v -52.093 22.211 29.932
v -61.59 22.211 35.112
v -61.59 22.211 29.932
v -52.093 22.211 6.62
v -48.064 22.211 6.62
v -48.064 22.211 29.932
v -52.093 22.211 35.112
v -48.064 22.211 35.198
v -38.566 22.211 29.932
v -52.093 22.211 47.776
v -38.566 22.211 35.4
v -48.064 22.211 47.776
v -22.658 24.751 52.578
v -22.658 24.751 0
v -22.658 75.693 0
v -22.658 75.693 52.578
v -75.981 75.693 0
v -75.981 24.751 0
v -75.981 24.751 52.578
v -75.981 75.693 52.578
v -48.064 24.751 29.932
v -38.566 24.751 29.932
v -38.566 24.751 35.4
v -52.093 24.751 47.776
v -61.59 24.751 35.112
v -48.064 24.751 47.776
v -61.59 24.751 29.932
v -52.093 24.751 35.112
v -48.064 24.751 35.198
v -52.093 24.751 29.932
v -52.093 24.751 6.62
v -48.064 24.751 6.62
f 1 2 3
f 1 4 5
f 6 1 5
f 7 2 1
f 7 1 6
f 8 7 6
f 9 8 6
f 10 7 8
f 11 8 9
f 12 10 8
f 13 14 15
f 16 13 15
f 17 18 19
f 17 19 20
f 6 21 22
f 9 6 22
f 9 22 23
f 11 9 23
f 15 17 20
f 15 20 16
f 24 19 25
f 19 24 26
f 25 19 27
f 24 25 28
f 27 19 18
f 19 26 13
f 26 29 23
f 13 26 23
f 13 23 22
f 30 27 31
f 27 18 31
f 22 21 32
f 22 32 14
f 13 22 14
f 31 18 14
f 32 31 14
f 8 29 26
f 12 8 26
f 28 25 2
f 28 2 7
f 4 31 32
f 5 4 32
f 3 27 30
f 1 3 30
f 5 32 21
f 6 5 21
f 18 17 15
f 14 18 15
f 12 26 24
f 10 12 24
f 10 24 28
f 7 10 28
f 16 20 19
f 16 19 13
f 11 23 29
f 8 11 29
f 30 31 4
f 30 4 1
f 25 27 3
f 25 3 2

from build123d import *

# Parameters (mm, degrees)
F0_W     = 53.322375752
F0_H     = 50.9416181594
F1_DEPTH = 52.578
F2_W     = 9.497590363
F2_H     = 5.180504173
F2_W_2   = 4.0292814374
F2_H_2   = 23.3122664504
F3_DEPTH = 2.54


with BuildPart() as f1:
    # F0 (on Top) → F1 (new body)
    with BuildSketch(Plane.XY):
        with Locations((-49.3195350282, 50.2221053466)):
            Rectangle(F0_W, F0_H)
    extrude(amount=F1_DEPTH)

    # F2 (on face) → F3 (join)
    with BuildSketch(Plane.XZ.offset(-24.7512962669)):
        with Locations((-56.8416379392, 32.5220506638)):
            Rectangle(F2_W, F2_H)
        Polygon((-48.0635613203, 35.1980318357), (-52.0928427577, 35.1123027503), (-52.0928427577, 29.9317985773), (-48.0635613203, 29.9317985773), align=None)
        Polygon((-38.5659709573, 35.4001075029), (-48.0635613203, 35.1980318357), (-48.0635613203, 29.9317985773), (-38.5659709573, 29.9317985773), align=None)
        with Locations((-50.078202039, 18.2756653521)):
            Rectangle(F2_W_2, F2_H_2)
        Polygon((-48.0635613203, 47.7757565677), (-52.0928427577, 47.7757565677), (-52.0928427577, 35.1123027503), (-48.0635613203, 35.1980318357), align=None)
    extrude(amount=F3_DEPTH)


solid = f1.part
